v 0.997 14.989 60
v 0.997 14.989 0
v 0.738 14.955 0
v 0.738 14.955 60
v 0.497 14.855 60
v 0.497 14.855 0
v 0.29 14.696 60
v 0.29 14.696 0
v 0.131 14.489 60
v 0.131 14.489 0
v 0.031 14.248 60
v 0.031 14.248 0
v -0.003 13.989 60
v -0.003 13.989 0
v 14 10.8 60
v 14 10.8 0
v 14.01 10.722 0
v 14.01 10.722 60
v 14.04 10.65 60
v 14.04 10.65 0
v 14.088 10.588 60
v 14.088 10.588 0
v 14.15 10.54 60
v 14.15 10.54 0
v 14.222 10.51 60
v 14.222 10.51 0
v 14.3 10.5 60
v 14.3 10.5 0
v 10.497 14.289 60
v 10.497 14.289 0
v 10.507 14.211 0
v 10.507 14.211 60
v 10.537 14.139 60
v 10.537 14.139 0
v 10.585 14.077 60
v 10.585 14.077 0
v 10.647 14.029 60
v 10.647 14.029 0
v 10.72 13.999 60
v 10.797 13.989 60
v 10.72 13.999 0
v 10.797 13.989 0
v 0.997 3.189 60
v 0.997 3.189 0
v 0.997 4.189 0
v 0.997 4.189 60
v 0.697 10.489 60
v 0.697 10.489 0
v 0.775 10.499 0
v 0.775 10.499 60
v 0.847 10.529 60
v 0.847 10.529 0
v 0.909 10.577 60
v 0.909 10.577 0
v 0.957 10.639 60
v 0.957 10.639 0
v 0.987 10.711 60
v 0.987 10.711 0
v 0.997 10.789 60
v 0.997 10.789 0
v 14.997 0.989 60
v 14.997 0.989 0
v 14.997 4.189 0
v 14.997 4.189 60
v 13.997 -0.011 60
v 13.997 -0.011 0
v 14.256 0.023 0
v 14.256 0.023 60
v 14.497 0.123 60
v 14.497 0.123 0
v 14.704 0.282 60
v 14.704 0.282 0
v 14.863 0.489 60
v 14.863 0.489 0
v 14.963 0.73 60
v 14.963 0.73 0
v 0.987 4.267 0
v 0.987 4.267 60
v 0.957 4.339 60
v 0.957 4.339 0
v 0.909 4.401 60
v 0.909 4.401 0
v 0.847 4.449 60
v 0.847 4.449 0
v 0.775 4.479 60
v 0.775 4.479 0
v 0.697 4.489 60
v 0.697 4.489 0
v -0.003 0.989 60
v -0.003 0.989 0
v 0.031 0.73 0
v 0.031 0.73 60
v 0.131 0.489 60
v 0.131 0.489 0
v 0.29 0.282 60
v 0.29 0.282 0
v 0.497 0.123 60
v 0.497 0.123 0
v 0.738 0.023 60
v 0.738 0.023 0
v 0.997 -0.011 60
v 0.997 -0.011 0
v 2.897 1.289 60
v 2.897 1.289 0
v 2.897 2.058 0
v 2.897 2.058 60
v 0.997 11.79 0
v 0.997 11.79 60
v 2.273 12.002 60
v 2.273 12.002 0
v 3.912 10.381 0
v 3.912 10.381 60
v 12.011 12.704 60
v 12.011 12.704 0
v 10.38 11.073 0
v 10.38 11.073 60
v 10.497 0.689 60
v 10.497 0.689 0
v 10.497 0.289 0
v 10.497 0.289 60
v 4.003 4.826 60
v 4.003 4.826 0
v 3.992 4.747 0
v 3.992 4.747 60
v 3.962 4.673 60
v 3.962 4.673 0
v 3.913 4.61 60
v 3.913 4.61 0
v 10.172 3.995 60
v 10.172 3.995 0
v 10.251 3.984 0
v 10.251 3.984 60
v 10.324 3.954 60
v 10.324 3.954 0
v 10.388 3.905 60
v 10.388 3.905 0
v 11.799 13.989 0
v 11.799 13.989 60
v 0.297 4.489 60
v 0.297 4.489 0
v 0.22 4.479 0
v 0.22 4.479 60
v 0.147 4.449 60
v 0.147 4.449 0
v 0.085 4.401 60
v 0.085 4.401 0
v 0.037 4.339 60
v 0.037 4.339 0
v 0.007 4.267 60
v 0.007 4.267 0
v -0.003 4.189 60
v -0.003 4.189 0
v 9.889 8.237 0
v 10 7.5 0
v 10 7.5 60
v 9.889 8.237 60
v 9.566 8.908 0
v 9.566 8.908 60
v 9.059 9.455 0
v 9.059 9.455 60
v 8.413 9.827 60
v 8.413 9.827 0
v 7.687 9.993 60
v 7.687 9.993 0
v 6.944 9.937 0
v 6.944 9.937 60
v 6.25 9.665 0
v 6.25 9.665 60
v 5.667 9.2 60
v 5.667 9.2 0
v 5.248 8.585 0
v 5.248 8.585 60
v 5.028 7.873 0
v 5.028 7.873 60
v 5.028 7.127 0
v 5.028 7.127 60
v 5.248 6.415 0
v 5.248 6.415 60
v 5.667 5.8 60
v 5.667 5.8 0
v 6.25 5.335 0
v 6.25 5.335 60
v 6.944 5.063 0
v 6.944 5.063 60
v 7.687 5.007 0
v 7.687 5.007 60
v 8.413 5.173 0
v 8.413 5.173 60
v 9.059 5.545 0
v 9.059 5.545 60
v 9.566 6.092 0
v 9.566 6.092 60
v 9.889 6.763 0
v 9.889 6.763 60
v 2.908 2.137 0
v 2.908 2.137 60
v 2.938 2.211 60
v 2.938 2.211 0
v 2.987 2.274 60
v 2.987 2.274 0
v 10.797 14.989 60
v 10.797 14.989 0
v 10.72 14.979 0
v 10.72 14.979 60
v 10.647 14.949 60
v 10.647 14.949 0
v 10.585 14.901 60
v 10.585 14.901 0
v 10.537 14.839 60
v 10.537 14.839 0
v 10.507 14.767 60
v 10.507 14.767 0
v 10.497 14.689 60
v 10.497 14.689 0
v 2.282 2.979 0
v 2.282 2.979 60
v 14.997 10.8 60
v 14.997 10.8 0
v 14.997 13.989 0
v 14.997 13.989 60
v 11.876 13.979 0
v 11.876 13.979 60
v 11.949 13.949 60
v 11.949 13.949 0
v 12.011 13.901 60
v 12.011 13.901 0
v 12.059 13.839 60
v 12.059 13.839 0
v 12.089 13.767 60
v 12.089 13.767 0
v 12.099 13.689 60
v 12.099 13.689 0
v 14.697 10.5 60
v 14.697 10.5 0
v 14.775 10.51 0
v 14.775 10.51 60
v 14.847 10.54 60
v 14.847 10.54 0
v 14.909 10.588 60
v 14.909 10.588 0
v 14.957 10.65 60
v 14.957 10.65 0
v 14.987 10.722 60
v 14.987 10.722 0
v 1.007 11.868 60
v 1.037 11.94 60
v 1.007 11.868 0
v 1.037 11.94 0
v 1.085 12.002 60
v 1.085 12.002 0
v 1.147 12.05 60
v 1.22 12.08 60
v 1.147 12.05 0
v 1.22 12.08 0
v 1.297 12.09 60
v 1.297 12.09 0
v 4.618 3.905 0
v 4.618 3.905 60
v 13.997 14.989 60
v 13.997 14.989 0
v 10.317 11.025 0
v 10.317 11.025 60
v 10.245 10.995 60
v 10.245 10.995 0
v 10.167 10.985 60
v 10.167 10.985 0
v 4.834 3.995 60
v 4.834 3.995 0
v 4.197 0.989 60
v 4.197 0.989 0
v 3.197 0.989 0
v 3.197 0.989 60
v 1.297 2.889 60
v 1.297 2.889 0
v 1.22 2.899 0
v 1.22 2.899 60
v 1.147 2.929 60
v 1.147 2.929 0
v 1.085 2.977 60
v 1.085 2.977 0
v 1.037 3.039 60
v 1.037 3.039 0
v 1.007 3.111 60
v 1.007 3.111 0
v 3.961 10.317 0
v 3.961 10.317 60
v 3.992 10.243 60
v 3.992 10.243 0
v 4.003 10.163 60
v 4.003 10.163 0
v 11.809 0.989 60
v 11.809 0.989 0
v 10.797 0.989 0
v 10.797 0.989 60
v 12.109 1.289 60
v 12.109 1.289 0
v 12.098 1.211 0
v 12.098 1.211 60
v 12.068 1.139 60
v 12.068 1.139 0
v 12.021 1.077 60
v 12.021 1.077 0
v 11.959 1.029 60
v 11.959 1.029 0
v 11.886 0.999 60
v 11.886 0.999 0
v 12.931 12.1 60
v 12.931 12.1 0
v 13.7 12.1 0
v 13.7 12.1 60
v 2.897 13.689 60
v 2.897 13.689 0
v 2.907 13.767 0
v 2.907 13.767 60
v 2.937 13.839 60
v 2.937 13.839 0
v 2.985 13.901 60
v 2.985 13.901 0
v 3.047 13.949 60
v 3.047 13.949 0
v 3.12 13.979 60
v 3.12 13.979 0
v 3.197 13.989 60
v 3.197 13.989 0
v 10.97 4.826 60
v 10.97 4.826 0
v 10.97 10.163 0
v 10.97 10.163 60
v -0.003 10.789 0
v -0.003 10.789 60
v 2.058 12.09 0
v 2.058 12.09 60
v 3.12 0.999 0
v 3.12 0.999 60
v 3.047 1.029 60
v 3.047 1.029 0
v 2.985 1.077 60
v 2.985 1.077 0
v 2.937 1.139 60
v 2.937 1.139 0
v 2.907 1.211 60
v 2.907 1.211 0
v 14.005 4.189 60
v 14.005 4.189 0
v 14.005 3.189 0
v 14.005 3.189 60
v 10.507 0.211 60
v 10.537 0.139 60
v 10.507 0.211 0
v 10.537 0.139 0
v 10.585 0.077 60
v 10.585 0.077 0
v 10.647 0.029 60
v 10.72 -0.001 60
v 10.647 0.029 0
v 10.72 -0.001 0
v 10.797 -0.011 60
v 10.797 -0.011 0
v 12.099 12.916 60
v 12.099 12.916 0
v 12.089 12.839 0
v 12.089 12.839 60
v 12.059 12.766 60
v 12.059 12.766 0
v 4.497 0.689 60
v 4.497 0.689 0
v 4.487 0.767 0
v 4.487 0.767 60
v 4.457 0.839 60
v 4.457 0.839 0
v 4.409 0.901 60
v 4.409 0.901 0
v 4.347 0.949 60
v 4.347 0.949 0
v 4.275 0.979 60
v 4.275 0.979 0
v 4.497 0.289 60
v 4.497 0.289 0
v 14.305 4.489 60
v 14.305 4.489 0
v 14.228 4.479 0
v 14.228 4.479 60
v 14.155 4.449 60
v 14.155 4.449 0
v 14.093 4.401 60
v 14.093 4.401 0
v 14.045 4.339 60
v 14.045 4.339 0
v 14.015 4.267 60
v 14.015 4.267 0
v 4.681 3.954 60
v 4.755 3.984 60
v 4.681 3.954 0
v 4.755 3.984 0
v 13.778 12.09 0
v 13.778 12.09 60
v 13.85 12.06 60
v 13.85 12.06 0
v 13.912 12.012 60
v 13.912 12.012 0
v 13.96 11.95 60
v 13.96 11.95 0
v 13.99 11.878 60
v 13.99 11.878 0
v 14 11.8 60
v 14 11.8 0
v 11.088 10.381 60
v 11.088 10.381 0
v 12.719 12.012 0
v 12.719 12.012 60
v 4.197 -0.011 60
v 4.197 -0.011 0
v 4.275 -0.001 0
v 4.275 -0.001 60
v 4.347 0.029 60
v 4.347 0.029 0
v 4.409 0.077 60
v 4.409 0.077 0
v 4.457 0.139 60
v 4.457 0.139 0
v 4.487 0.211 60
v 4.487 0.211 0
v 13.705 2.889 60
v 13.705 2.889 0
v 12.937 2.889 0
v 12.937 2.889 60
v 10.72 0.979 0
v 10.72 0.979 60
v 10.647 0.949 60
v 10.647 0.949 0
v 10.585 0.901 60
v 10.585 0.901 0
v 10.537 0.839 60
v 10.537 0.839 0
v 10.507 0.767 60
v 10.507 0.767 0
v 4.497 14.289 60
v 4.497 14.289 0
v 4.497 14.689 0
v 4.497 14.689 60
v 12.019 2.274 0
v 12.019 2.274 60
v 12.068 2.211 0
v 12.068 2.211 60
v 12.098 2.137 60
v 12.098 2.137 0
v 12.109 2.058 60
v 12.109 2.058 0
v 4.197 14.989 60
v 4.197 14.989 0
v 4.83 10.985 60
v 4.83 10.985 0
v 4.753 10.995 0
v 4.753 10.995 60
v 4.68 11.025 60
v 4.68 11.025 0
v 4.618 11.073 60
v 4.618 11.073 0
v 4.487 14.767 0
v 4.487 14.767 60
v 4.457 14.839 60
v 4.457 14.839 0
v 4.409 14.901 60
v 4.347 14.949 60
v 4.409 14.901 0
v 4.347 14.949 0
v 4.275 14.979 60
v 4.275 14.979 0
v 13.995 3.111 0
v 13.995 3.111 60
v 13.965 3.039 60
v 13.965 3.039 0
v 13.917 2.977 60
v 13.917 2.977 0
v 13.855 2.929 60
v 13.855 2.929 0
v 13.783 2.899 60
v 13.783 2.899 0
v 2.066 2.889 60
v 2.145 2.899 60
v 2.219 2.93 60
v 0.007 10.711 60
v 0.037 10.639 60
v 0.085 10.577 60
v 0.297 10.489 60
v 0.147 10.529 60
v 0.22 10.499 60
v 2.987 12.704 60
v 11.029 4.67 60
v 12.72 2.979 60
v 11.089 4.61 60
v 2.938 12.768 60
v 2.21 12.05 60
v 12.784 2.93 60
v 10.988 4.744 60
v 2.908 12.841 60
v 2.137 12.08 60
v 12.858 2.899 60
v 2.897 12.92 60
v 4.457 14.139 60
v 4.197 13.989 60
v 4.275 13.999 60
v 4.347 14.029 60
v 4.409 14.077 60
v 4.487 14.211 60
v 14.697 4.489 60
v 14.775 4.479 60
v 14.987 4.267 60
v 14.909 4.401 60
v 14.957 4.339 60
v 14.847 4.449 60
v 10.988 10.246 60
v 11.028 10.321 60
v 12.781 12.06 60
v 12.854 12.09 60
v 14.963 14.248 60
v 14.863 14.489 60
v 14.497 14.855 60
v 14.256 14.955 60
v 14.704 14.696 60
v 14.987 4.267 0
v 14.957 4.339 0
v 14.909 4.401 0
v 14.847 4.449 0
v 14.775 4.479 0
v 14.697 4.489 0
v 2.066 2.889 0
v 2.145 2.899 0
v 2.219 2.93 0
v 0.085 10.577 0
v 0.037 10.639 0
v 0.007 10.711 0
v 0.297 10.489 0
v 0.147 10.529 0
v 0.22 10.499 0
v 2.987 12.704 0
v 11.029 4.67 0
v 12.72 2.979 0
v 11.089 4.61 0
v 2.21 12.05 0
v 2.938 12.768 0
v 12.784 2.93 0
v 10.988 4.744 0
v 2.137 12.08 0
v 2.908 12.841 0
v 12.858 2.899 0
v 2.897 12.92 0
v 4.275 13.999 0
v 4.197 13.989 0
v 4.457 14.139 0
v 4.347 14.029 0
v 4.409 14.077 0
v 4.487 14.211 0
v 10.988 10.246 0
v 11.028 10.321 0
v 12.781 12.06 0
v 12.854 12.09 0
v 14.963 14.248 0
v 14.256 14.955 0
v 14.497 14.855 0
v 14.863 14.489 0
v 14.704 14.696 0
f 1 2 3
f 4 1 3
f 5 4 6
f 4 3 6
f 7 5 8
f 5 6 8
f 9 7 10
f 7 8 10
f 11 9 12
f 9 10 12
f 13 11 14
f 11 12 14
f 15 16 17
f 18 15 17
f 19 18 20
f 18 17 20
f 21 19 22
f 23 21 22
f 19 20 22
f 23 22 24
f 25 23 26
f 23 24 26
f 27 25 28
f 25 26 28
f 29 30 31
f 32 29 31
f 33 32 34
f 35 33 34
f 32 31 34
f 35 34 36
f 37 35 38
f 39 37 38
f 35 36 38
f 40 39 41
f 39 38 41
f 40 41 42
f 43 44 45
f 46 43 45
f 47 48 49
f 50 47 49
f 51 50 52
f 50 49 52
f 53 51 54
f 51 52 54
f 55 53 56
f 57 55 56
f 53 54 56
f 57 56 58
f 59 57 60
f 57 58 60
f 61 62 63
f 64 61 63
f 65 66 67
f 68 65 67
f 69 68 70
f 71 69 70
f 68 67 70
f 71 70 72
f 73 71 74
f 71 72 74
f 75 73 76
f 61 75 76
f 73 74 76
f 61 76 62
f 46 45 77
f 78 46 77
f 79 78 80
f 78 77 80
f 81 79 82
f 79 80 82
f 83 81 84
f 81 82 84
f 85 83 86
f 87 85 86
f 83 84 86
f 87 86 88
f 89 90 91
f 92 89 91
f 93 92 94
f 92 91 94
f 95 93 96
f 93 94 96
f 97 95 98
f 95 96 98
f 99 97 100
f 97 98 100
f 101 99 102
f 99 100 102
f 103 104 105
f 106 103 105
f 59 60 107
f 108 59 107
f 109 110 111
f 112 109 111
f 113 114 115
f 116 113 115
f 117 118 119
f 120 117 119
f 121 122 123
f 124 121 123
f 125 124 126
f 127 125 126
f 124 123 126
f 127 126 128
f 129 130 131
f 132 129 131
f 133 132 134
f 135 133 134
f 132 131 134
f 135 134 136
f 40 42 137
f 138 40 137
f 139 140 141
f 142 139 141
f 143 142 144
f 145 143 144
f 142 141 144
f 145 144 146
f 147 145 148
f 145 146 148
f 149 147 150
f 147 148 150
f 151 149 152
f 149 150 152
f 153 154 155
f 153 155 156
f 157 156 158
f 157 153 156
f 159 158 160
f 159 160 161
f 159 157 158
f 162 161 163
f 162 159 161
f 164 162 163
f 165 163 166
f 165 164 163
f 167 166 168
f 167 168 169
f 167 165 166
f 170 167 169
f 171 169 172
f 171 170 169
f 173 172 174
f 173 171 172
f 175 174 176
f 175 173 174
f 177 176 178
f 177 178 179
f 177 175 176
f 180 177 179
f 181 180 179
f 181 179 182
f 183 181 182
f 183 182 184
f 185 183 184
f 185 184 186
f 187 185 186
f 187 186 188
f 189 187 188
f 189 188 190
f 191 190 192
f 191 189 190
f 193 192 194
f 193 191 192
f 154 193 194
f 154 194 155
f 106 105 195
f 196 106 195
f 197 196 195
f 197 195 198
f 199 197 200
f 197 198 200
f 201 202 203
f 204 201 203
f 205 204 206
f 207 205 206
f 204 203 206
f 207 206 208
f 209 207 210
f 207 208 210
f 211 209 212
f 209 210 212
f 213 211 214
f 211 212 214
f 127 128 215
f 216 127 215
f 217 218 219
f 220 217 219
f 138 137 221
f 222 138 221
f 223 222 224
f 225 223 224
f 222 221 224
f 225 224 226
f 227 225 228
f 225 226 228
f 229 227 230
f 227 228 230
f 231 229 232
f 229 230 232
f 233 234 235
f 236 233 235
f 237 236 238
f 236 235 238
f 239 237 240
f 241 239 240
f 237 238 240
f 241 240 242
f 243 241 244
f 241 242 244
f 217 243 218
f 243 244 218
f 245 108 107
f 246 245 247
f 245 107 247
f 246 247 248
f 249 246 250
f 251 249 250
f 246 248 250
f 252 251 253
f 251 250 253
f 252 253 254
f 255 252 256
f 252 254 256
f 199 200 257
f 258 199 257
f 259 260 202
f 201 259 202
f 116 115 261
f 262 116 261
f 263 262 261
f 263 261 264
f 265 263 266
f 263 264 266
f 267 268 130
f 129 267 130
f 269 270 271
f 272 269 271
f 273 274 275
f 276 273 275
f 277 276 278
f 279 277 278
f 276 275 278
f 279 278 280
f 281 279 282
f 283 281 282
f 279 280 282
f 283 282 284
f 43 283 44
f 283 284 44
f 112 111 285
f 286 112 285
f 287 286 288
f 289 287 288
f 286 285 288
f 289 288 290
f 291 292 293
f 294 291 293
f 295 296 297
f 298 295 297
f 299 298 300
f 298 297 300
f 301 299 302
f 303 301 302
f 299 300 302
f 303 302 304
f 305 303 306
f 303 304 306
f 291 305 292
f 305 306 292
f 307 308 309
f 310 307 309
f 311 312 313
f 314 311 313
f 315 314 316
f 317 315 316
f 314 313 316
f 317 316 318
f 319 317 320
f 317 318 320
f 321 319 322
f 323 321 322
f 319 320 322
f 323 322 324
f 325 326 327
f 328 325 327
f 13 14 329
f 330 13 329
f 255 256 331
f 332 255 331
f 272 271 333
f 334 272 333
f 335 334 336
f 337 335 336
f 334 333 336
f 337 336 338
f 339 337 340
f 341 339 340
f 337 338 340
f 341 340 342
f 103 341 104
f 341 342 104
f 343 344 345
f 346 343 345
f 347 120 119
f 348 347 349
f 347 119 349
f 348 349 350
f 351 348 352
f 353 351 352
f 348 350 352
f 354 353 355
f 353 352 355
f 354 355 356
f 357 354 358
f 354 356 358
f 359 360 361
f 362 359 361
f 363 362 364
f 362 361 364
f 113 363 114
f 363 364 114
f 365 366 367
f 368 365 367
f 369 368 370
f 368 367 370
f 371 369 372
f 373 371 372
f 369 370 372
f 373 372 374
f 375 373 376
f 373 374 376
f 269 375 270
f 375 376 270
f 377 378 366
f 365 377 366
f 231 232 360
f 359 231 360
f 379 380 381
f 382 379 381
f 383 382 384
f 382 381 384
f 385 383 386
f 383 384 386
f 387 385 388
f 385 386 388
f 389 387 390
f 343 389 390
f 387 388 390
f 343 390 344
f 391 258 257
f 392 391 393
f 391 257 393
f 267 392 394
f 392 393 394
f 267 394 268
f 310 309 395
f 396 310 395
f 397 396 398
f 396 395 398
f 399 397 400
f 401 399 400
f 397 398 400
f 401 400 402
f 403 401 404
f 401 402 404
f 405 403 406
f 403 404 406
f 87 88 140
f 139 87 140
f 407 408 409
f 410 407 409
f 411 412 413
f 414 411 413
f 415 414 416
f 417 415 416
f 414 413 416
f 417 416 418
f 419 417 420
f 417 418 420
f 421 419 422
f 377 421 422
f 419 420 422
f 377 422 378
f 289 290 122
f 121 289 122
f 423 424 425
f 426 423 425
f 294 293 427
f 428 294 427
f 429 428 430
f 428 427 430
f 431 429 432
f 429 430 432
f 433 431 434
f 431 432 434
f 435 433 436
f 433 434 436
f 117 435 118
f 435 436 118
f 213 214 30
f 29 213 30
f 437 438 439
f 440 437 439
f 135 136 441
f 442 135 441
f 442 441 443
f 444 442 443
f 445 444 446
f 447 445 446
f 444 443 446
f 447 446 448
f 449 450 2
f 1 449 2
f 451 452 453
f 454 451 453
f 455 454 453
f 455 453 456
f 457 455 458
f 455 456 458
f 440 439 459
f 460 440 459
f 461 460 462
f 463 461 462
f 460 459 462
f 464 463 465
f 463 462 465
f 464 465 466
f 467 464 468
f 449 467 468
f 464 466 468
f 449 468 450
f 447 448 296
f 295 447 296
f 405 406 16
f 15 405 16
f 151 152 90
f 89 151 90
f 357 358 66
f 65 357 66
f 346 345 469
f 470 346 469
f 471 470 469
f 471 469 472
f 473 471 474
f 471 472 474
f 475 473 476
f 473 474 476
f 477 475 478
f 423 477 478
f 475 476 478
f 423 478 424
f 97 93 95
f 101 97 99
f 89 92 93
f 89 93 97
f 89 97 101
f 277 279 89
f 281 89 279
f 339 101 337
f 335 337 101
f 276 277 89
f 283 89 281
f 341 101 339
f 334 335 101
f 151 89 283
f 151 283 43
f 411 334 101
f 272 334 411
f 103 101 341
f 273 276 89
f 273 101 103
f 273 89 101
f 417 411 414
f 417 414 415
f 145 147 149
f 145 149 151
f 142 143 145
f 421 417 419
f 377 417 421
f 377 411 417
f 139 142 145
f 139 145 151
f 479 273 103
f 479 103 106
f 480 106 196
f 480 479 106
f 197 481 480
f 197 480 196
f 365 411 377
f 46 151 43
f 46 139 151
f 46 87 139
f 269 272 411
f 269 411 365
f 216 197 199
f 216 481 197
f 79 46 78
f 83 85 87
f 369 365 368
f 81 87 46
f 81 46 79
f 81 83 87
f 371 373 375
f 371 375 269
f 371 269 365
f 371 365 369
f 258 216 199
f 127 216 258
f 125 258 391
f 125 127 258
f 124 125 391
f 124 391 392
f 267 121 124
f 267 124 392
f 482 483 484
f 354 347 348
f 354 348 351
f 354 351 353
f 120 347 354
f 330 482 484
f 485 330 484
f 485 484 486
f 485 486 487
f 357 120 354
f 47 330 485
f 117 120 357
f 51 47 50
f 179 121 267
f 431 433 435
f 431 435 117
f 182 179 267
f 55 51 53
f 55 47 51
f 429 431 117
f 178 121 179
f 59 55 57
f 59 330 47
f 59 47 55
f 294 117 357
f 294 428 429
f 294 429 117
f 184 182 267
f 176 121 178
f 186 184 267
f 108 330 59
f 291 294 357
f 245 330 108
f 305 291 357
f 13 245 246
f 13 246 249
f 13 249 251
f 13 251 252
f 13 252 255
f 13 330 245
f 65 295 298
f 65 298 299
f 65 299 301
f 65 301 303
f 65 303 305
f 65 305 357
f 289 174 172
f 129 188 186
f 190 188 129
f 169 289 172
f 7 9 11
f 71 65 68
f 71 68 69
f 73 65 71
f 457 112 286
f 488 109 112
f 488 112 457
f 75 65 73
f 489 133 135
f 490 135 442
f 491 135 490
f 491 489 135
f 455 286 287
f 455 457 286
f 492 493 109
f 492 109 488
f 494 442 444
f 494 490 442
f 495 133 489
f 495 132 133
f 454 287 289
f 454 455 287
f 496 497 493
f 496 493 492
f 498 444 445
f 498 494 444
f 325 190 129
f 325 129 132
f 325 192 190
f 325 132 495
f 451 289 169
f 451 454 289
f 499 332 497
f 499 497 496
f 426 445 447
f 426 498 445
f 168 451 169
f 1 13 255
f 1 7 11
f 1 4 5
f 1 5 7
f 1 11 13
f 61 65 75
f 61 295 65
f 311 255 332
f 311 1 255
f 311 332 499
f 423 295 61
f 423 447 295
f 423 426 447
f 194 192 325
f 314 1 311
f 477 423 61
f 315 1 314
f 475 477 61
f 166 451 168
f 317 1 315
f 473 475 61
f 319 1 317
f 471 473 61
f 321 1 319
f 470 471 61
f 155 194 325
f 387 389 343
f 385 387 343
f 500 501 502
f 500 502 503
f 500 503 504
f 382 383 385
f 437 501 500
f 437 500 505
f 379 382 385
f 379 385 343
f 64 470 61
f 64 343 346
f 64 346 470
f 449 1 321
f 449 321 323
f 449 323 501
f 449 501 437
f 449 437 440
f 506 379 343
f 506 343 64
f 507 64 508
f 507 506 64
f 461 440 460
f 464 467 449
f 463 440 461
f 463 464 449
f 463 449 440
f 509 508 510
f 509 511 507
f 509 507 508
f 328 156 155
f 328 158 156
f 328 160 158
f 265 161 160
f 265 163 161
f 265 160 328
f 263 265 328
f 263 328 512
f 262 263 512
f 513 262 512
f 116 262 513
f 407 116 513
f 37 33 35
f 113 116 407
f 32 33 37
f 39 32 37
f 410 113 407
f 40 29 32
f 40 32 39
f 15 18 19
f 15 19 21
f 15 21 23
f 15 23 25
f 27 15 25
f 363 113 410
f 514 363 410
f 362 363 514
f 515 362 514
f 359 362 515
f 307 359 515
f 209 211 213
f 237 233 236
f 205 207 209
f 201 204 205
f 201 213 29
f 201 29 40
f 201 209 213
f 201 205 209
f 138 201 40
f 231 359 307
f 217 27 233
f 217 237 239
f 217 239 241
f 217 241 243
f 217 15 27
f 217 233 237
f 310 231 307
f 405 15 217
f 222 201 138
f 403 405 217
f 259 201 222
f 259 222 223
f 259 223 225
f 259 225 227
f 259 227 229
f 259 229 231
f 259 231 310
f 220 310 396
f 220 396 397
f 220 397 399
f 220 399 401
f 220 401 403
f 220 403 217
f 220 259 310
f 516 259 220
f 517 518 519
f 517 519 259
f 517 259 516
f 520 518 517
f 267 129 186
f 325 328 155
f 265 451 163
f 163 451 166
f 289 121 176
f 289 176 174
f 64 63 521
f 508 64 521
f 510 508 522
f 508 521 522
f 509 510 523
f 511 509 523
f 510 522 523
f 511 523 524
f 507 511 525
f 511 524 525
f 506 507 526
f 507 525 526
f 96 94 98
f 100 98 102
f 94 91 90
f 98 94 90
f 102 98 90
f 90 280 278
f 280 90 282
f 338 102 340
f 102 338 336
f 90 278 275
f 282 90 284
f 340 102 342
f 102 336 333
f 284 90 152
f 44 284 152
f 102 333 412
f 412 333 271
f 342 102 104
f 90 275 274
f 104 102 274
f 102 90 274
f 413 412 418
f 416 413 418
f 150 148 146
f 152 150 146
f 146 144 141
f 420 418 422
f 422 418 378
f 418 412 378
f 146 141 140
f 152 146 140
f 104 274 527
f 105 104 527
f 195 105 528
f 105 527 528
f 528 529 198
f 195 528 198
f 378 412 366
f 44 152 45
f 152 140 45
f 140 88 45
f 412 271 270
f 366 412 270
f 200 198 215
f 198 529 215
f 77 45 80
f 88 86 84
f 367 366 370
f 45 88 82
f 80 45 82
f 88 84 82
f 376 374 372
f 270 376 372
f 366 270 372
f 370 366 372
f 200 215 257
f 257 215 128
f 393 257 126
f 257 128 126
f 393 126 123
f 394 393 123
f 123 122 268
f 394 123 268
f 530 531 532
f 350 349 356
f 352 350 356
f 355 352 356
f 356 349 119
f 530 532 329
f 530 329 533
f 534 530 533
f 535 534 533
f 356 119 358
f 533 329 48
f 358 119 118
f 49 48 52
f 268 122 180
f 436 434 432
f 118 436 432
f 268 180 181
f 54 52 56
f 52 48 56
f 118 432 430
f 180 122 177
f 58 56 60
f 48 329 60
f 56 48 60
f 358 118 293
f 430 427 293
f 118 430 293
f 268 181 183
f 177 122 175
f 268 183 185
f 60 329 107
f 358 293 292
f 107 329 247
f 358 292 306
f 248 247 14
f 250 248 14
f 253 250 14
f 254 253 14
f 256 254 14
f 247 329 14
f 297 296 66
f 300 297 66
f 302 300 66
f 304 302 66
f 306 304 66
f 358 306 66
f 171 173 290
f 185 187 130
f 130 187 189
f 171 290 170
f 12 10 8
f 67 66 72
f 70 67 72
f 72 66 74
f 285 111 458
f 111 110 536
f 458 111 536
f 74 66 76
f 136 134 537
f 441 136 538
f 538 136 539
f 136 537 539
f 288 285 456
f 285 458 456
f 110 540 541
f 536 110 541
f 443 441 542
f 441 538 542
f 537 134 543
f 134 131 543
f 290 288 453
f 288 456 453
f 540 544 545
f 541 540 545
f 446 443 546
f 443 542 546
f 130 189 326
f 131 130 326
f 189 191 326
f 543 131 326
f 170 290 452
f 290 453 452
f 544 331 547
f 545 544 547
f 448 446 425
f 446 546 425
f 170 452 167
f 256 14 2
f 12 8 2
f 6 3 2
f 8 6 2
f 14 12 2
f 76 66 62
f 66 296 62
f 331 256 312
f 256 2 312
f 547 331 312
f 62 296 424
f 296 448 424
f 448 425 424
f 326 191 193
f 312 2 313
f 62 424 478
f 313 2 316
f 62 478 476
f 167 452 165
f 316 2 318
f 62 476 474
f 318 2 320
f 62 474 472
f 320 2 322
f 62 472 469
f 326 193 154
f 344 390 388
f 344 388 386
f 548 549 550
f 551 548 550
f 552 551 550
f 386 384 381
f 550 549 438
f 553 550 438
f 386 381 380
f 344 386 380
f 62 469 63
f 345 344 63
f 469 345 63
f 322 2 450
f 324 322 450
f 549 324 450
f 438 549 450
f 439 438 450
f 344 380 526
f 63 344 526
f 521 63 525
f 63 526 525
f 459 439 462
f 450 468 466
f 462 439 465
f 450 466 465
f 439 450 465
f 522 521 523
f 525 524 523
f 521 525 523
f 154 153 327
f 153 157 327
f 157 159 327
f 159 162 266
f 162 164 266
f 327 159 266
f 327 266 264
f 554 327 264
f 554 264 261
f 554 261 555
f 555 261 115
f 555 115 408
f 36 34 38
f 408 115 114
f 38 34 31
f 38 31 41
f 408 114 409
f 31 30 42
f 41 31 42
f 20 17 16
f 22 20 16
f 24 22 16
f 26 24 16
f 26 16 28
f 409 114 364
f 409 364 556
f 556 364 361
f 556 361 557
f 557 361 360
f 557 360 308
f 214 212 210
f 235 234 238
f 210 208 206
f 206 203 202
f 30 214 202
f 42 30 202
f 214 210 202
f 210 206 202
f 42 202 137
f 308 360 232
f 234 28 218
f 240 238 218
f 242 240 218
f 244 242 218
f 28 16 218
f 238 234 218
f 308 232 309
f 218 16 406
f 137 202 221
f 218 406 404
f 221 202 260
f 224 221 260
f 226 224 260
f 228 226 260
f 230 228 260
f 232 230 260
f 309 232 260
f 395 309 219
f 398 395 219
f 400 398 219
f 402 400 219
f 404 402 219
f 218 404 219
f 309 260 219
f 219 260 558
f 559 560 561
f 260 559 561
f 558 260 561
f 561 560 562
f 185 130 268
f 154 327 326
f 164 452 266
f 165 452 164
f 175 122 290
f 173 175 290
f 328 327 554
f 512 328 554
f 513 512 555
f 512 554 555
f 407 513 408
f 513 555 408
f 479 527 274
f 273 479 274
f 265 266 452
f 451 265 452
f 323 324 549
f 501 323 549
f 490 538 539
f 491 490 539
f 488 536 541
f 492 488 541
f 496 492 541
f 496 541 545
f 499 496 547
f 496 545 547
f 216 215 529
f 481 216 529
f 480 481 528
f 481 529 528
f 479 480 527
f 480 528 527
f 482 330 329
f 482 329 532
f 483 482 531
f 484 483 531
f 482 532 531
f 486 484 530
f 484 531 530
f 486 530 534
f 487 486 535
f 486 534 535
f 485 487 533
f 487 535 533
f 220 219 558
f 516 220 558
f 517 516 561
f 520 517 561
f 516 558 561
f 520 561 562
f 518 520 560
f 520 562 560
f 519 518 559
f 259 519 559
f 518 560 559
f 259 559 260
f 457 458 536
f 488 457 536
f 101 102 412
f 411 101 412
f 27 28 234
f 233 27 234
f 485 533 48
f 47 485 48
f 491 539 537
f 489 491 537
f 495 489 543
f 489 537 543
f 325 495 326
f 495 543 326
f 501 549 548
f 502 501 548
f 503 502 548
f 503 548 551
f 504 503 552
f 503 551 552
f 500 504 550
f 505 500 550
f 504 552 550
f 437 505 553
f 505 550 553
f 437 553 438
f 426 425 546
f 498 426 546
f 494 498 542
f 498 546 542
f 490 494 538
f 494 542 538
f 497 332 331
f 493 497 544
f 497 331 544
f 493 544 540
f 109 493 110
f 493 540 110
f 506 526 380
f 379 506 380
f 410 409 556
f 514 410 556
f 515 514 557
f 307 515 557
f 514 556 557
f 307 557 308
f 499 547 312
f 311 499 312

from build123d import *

# Parameters (mm, degrees)
SKETCH1_R           = 2.5
BOSS_EXTRUDE1_DEPTH = 60


with BuildPart() as part:
    # Sketch1 → Boss-Extrude1 (new body)
    with BuildSketch(Plane.XY):
        with BuildLine():
            Line((0.997149379, -0.010991612), (4.197149379, -0.010991612))
            ThreePointArc((4.197149379, -0.010991612), (4.409281413, 0.076876353), (4.497149379, 0.289008388))
            Line((4.497149379, 0.289008388), (4.497149379, 0.689008388))
            ThreePointArc((4.497149379, 0.689008388), (4.409281413, 0.901140422), (4.197149379, 0.989008388))
            Line((4.197149379, 0.989008388), (3.197149379, 0.989008388))
            ThreePointArc((3.197149379, 0.989008388), (2.985017344, 1.076876353), (2.897149379, 1.289008388))
            Line((2.897149379, 1.289008388), (2.897149379, 2.057637538))
            ThreePointArc((2.897149379, 2.057637538), (2.920422177, 2.174637797), (2.9866975, 2.273825827))
            Line((2.9866975, 2.273825827), (4.61806835, 3.905196677))
            ThreePointArc((4.61806835, 3.905196677), (4.71725638, 3.971472), (4.834256639, 3.994744798))
            Line((4.834256639, 3.994744798), (10.171514939, 3.994744798))
            ThreePointArc((10.171514939, 3.994744798), (10.288515198, 3.971472), (10.387703228, 3.905196677))
            Line((10.387703228, 3.905196677), (12.019074078, 2.273825827))
            ThreePointArc((12.019074078, 2.273825827), (12.085349401, 2.174637797), (12.1086222, 2.057637538))
            Line((12.1086222, 2.057637538), (12.1086222, 1.289008388))
            ThreePointArc((12.1086222, 1.289008388), (12.020754234, 1.076876353), (11.8086222, 0.989008388))
            Line((11.8086222, 0.989008388), (10.797149379, 0.989008388))
            ThreePointArc((10.797149379, 0.989008388), (10.585017344, 0.901140422), (10.497149379, 0.689008388))
            Line((10.497149379, 0.689008388), (10.497149379, 0.289008388))
            ThreePointArc((10.497149379, 0.289008388), (10.585017344, 0.076876353), (10.797149379, -0.010991612))
            Line((10.797149379, -0.010991612), (13.997149379, -0.010991612))
            ThreePointArc((13.997149379, -0.010991612), (14.70425616, 0.281901607), (14.997149379, 0.989008388))
            Line((14.997149379, 0.989008388), (14.997149379, 4.189008388))
            ThreePointArc((14.997149379, 4.189008388), (14.909281413, 4.401140422), (14.697149379, 4.489008388))
            Line((14.697149379, 4.489008388), (14.305261888, 4.489008388))
            ThreePointArc((14.305261888, 4.489008388), (14.093129854, 4.401140422), (14.005261888, 4.189008388))
            Line((14.005261888, 4.189008388), (14.005261888, 3.189008388))
            ThreePointArc((14.005261888, 3.189008388), (13.917393922, 2.976876353), (13.705261888, 2.889008388))
            Line((13.705261888, 2.889008388), (12.936632738, 2.889008388))
            ThreePointArc((12.936632738, 2.889008388), (12.819632479, 2.912281186), (12.720444449, 2.978556509))
            Line((12.720444449, 2.978556509), (11.089073599, 4.609927359))
            ThreePointArc((11.089073599, 4.609927359), (11.006246661, 4.70520219), (10.969948855, 4.826115648))
            Line((10.969948855, 4.826115648), (10.969948855, 10.163373948))
            ThreePointArc((10.969948855, 10.163373948), (11.00546556, 10.284783861), (11.087867966, 10.380761184))
            Line((11.087867966, 10.380761184), (12.719238816, 12.012132034))
            ThreePointArc((12.719238816, 12.012132034), (12.81656582, 12.07716386), (12.93137085, 12.1))
            Line((12.93137085, 12.1), (13.7, 12.1))
            ThreePointArc((13.7, 12.1), (13.912132034, 12.012132034), (14, 11.8))
            Line((14, 11.8), (14, 10.8))
            ThreePointArc((14, 10.8), (14.087867966, 10.587867966), (14.3, 10.5))
            Line((14.3, 10.5), (14.697149379, 10.5))
            ThreePointArc((14.697149379, 10.5), (14.909281413, 10.587867966), (14.997149379, 10.8))
            Line((14.997149379, 10.8), (14.997149379, 13.989008388))
            ThreePointArc((14.997149379, 13.989008388), (14.70425616, 14.696115169), (13.997149379, 14.989008388))
            Line((13.997149379, 14.989008388), (10.797149379, 14.989008388))
            ThreePointArc((10.797149379, 14.989008388), (10.585017344, 14.901140422), (10.497149379, 14.689008388))
            Line((10.497149379, 14.689008388), (10.497149379, 14.289008388))
            ThreePointArc((10.497149379, 14.289008388), (10.585017344, 14.076876353), (10.797149379, 13.989008388))
            Line((10.797149379, 13.989008388), (11.798829534, 13.989008388))
            ThreePointArc((11.798829534, 13.989008388), (12.010961569, 13.901140422), (12.098829534, 13.689008388))
            Line((12.098829534, 13.689008388), (12.098829534, 12.916322983))
            ThreePointArc((12.098829534, 12.916322983), (12.075993394, 12.801517953), (12.010961569, 12.704190949))
            Line((12.010961569, 12.704190949), (10.379590719, 11.072820099))
            ThreePointArc((10.379590719, 11.072820099), (10.282263714, 11.007788273), (10.167458684, 10.984952133))
            Line((10.167458684, 10.984952133), (4.830200384, 10.984952133))
            ThreePointArc((4.830200384, 10.984952133), (4.715395355, 11.007788273), (4.61806835, 11.072820099))
            Line((4.61806835, 11.072820099), (2.9866975, 12.704190949))
            ThreePointArc((2.9866975, 12.704190949), (2.920422177, 12.803378979), (2.897149379, 12.920379238))
            Line((2.897149379, 12.920379238), (2.897149379, 13.689008388))
            ThreePointArc((2.897149379, 13.689008388), (2.985017344, 13.901140422), (3.197149379, 13.989008388))
            Line((3.197149379, 13.989008388), (4.197149379, 13.989008388))
            ThreePointArc((4.197149379, 13.989008388), (4.409281413, 14.076876353), (4.497149379, 14.289008388))
            Line((4.497149379, 14.289008388), (4.497149379, 14.689008388))
            ThreePointArc((4.497149379, 14.689008388), (4.409281413, 14.901140422), (4.197149379, 14.989008388))
            Line((4.197149379, 14.989008388), (0.997149379, 14.989008388))
            ThreePointArc((0.997149379, 14.989008388), (0.290042597, 14.696115169), (-0.002850621, 13.989008388))
            Line((-0.002850621, 13.989008388), (-0.002850621, 10.789008388))
            ThreePointArc((-0.002850621, 10.789008388), (0.085017344, 10.576876353), (0.297149379, 10.489008388))
            Line((0.297149379, 10.489008388), (0.697149379, 10.489008388))
            ThreePointArc((0.697149379, 10.489008388), (0.909281413, 10.576876353), (0.997149379, 10.789008388))
            Line((0.997149379, 10.789008388), (0.997149379, 11.790199043))
            ThreePointArc((0.997149379, 11.790199043), (1.085017344, 12.002331078), (1.297149379, 12.090199043))
            Line((1.297149379, 12.090199043), (2.057928823, 12.090199043))
            ThreePointArc((2.057928823, 12.090199043), (2.174143192, 12.067250491), (2.272911478, 12.001849869))
            Line((2.272911478, 12.001849869), (3.912132034, 10.380761184))
            ThreePointArc((3.912132034, 10.380761184), (3.97928656, 10.281159192), (4.002885789, 10.163373948))
            Line((4.002885789, 10.163373948), (4.002885789, 4.826115648))
            ThreePointArc((4.002885789, 4.826115648), (3.979612991, 4.709115389), (3.913337668, 4.609927359))
            Line((3.913337668, 4.609927359), (2.281966818, 2.978556509))
            ThreePointArc((2.281966818, 2.978556509), (2.182778788, 2.912281186), (2.065778529, 2.889008388))
            Line((2.065778529, 2.889008388), (1.297149379, 2.889008388))
            ThreePointArc((1.297149379, 2.889008388), (1.085017344, 2.976876353), (0.997149379, 3.189008388))
            Line((0.997149379, 3.189008388), (0.997149379, 4.189008388))
            ThreePointArc((0.997149379, 4.189008388), (0.909281413, 4.401140422), (0.697149379, 4.489008388))
            Line((0.697149379, 4.489008388), (0.297149379, 4.489008388))
            ThreePointArc((0.297149379, 4.489008388), (0.085017344, 4.401140422), (-0.002850621, 4.189008388))
            Line((-0.002850621, 4.189008388), (-0.002850621, 0.989008388))
            ThreePointArc((-0.002850621, 0.989008388), (0.290042597, 0.281901607), (0.997149379, -0.010991612))
        make_face()
        with Locations((7.5, 7.5)):
            Circle(SKETCH1_R, mode=Mode.SUBTRACT)
    extrude(amount=BOSS_EXTRUDE1_DEPTH)


solid = part.part
